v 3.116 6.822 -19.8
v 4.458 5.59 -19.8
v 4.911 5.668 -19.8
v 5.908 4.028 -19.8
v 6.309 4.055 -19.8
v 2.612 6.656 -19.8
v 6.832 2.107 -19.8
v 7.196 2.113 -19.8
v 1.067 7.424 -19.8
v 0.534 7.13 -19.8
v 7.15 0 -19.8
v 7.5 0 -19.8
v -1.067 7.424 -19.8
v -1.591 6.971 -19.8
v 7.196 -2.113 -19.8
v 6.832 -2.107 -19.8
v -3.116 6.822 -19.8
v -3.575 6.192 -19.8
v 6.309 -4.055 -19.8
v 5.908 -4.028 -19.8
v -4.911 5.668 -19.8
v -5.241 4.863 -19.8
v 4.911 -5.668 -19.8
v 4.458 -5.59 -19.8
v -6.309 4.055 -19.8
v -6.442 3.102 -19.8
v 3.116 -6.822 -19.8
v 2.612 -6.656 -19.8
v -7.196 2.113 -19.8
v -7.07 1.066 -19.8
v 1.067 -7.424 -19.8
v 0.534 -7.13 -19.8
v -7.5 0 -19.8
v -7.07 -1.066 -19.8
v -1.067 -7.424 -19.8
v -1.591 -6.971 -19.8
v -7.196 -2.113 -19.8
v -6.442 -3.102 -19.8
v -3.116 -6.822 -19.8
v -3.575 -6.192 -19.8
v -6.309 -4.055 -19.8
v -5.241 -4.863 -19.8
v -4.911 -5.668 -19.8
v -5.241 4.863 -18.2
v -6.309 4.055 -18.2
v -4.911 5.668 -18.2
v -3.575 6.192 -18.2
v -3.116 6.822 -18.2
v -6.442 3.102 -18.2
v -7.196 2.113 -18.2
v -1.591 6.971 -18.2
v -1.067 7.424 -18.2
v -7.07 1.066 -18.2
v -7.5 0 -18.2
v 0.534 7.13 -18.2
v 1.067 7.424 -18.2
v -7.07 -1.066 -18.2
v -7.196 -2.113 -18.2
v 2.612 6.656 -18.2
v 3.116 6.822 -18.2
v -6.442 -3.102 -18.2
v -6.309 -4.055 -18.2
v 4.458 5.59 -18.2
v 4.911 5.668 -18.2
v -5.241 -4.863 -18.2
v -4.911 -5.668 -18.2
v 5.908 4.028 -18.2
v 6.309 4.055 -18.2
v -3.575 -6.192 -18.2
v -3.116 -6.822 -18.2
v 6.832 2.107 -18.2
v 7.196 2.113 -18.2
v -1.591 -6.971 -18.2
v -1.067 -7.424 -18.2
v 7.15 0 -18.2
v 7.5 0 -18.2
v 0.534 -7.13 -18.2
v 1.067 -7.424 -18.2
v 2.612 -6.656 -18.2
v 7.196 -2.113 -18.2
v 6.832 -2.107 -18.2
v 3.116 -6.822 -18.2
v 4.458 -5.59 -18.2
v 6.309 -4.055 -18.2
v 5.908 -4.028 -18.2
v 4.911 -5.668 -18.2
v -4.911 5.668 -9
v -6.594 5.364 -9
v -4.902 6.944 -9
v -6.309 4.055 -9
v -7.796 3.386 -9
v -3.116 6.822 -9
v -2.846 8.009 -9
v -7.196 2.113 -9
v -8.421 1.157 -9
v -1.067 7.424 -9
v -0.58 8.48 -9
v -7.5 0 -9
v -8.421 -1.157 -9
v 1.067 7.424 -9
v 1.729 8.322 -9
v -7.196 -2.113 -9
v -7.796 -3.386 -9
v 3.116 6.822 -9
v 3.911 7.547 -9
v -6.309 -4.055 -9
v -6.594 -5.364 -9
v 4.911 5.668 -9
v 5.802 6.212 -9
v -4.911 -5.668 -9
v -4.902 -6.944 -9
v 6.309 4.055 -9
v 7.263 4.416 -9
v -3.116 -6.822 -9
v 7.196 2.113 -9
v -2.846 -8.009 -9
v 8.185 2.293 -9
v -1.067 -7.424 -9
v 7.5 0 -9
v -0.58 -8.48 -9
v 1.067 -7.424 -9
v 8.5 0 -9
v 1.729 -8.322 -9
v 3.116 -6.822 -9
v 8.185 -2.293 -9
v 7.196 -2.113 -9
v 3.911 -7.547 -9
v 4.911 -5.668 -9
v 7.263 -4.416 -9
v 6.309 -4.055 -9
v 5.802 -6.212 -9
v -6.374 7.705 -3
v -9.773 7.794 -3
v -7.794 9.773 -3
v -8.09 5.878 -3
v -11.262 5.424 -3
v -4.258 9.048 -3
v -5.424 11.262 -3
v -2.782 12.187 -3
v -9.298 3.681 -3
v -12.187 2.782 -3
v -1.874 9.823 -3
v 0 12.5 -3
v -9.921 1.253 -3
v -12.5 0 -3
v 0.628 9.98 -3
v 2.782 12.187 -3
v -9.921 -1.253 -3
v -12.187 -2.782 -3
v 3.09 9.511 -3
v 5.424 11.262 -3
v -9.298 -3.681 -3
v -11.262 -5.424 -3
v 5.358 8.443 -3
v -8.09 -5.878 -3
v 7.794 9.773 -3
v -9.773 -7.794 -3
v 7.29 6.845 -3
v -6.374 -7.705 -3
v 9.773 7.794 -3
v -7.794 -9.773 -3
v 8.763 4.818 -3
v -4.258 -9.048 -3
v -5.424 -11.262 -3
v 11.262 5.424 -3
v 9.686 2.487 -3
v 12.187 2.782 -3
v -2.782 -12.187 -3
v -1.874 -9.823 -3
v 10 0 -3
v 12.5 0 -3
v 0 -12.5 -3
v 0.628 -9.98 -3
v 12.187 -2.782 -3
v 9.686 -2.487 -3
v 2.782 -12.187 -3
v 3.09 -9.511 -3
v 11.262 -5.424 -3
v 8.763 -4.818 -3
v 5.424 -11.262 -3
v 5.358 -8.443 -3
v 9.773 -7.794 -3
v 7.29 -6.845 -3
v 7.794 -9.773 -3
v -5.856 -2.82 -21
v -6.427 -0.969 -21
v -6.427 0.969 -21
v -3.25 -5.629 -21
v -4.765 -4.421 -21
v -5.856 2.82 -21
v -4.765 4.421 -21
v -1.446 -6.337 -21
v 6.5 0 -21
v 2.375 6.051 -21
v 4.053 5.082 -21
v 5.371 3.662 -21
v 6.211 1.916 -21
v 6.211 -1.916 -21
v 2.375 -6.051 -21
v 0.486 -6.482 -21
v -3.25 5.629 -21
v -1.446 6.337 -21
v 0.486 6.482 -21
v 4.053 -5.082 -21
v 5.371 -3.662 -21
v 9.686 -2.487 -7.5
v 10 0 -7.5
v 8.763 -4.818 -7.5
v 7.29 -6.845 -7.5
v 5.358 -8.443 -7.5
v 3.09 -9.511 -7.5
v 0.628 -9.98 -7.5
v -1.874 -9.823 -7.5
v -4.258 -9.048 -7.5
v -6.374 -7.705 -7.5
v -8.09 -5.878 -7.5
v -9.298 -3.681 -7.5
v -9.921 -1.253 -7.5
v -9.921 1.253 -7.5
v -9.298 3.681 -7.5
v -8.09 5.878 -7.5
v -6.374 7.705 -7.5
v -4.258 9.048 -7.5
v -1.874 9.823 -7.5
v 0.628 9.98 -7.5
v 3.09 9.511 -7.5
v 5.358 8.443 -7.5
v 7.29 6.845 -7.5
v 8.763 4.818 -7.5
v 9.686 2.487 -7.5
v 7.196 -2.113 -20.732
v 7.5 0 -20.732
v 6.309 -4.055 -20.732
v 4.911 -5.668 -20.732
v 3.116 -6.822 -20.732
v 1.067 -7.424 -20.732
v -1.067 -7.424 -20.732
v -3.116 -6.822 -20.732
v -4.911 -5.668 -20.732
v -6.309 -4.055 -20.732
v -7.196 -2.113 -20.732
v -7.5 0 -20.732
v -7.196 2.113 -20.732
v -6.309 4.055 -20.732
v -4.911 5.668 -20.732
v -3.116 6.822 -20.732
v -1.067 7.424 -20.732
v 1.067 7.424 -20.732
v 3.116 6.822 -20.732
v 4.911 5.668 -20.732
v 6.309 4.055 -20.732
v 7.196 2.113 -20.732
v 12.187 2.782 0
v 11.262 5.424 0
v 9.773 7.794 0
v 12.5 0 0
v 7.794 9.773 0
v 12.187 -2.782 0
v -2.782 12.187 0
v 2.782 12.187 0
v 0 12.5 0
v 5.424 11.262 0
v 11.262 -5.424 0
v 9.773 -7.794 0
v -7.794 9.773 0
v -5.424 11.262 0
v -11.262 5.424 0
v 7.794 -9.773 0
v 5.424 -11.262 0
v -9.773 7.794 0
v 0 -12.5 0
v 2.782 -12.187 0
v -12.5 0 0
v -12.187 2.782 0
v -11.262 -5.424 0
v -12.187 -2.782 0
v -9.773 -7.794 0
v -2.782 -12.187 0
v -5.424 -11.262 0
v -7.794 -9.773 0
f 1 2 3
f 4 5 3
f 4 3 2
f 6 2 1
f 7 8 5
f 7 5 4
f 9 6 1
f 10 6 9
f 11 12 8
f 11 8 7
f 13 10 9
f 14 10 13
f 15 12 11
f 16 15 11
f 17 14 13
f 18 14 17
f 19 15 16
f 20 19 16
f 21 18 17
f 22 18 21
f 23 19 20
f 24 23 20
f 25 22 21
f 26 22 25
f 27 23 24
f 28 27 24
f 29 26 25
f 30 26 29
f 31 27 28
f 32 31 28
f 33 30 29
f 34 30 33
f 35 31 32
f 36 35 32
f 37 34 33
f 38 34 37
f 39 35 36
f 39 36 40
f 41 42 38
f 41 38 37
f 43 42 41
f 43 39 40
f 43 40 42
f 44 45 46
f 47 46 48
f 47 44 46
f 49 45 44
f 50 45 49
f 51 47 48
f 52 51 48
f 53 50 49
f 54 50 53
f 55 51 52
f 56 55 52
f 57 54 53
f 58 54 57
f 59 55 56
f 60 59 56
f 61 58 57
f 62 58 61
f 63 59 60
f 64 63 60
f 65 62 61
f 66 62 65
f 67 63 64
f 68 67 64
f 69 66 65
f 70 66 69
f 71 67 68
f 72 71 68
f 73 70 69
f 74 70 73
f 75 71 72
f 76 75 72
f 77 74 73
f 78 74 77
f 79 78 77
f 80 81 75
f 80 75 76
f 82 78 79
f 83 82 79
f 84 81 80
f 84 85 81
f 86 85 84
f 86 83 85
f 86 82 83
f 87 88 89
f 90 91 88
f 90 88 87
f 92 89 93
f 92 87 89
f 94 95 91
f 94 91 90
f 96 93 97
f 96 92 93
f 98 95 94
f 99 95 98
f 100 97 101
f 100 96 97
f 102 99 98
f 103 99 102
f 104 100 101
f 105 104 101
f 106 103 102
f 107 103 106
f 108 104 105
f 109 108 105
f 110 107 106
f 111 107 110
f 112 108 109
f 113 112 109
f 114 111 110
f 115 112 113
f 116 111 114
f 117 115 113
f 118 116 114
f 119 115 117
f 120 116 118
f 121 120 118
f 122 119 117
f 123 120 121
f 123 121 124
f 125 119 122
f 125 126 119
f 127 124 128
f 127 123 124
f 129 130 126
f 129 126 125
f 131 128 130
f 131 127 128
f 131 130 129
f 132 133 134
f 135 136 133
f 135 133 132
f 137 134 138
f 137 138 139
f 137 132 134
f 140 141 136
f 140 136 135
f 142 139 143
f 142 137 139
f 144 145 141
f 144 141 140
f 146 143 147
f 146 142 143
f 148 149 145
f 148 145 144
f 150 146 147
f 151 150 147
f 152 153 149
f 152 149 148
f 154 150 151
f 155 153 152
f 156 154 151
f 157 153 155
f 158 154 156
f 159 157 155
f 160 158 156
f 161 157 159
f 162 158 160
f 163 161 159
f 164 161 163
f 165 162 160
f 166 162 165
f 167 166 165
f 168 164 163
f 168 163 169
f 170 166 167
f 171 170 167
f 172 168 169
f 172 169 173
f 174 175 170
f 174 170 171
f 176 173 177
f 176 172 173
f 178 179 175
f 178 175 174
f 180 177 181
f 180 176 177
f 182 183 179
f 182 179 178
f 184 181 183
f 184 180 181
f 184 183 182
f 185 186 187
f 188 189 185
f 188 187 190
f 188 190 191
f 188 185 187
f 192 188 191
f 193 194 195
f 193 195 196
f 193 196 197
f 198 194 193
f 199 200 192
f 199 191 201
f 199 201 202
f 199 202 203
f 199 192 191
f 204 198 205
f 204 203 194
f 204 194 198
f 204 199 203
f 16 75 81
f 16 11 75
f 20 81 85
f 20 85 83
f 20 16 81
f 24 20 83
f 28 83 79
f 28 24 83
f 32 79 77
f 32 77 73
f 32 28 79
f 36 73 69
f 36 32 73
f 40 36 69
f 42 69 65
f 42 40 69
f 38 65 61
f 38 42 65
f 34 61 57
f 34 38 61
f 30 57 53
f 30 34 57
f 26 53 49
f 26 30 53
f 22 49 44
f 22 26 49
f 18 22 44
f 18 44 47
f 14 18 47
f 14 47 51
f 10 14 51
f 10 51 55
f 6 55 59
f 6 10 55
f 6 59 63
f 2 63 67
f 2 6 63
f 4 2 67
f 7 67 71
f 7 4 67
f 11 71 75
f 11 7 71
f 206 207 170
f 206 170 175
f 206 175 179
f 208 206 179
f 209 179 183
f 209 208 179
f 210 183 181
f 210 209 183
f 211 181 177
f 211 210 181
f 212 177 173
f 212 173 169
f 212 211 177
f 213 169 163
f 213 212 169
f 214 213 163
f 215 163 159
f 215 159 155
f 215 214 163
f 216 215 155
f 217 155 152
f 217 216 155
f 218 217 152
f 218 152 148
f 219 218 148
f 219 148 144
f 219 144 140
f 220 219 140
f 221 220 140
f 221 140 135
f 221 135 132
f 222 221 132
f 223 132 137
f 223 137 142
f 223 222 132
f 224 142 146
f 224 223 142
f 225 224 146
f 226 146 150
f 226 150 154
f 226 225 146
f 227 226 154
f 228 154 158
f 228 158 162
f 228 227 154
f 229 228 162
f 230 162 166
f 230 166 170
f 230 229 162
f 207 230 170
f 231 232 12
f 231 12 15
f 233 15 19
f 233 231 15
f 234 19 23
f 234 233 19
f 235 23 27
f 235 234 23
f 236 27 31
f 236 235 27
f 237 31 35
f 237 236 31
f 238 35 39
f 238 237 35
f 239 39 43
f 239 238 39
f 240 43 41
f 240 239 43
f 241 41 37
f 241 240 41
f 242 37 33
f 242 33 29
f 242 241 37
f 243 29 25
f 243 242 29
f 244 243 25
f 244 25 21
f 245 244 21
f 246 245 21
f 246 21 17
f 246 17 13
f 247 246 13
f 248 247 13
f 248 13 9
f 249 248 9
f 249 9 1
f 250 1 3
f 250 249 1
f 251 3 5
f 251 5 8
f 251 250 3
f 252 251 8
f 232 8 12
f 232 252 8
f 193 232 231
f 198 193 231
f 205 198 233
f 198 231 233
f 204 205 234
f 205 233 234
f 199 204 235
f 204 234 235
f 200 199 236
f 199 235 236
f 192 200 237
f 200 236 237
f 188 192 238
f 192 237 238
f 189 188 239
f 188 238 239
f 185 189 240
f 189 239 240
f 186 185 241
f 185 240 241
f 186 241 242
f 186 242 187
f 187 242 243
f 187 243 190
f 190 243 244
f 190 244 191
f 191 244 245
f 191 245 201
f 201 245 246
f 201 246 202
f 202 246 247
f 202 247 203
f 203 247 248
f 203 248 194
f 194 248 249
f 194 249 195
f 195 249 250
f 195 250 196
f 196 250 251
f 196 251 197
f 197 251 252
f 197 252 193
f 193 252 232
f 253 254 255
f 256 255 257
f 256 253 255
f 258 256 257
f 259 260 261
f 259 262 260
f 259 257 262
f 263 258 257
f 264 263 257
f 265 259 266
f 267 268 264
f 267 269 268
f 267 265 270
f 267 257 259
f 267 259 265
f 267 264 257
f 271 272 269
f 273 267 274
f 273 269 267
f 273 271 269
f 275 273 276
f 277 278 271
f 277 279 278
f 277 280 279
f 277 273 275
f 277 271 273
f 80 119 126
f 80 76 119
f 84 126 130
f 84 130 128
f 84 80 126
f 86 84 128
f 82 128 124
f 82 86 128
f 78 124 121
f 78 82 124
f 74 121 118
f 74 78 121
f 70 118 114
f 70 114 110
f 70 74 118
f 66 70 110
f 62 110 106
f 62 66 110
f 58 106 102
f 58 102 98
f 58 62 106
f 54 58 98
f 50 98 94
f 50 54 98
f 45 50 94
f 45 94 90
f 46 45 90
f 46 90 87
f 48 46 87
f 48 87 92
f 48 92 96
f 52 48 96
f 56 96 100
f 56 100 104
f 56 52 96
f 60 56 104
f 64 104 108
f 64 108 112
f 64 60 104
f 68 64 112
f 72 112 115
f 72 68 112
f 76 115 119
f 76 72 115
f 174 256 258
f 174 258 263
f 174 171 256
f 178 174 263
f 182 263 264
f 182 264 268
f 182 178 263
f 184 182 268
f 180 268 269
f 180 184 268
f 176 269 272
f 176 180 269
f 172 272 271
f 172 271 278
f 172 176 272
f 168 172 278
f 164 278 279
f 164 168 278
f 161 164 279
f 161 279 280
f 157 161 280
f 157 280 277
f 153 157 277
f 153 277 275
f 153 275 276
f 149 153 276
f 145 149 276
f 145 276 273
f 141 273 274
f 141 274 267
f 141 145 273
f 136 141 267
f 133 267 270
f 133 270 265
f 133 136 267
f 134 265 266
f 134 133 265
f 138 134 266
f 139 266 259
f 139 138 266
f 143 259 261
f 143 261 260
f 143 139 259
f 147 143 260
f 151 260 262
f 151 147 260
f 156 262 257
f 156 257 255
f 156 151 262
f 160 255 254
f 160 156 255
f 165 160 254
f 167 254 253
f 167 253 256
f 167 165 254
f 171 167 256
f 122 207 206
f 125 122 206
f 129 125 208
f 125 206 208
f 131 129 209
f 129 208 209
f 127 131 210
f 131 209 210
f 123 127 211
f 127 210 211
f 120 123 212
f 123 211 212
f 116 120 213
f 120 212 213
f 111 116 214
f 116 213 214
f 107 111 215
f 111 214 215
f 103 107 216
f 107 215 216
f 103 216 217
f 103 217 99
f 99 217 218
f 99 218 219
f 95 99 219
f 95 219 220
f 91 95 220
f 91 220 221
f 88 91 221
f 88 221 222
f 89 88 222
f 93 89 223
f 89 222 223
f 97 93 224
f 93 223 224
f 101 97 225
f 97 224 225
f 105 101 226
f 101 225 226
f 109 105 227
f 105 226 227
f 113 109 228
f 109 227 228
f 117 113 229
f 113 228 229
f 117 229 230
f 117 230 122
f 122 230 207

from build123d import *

# Parameters (mm, degrees)
CHAMFER1_SIZE  = 1
CHAMFER1_SIZE2 = 0.267949192
CHAMFER2_SIZE  = 1.5


with BuildPart() as part:
    # Sketch1 → Revolve1 (revolve)
    with BuildSketch(Plane(origin=(0, 0, 0), x_dir=(1, 0, 0), z_dir=(0, 1, 0))):
        Polygon((0, 0), (12.5, 0), (12.5, 3), (10, 3), (10, 9), (7.5, 9), (7.5, 18.2), (7.15, 18.2), (7.15, 19.8), (7.5, 19.8), (7.5, 21), (0, 21), align=None)
    revolve(axis=Axis((0, 0, 0), (0, 0, -1)))

    # Chamfer1
    chamfer1_edges = [part.edges().sort_by_distance(p)[0] for p in [
        (-7.5, 0, -21),
    ]]
    chamfer1_side = [part.faces().sort_by_distance(p)[0] for p in [
        (0, 0, -21),
    ]]
    chamfer(chamfer1_edges, length=CHAMFER1_SIZE, length2=CHAMFER1_SIZE2, reference=chamfer1_side[0])

    # Chamfer2
    chamfer2_edges = [part.edges().sort_by_distance(p)[0] for p in [
        (-10, 0, -9),
    ]]
    chamfer(chamfer2_edges, length=CHAMFER2_SIZE)


solid = part.part
